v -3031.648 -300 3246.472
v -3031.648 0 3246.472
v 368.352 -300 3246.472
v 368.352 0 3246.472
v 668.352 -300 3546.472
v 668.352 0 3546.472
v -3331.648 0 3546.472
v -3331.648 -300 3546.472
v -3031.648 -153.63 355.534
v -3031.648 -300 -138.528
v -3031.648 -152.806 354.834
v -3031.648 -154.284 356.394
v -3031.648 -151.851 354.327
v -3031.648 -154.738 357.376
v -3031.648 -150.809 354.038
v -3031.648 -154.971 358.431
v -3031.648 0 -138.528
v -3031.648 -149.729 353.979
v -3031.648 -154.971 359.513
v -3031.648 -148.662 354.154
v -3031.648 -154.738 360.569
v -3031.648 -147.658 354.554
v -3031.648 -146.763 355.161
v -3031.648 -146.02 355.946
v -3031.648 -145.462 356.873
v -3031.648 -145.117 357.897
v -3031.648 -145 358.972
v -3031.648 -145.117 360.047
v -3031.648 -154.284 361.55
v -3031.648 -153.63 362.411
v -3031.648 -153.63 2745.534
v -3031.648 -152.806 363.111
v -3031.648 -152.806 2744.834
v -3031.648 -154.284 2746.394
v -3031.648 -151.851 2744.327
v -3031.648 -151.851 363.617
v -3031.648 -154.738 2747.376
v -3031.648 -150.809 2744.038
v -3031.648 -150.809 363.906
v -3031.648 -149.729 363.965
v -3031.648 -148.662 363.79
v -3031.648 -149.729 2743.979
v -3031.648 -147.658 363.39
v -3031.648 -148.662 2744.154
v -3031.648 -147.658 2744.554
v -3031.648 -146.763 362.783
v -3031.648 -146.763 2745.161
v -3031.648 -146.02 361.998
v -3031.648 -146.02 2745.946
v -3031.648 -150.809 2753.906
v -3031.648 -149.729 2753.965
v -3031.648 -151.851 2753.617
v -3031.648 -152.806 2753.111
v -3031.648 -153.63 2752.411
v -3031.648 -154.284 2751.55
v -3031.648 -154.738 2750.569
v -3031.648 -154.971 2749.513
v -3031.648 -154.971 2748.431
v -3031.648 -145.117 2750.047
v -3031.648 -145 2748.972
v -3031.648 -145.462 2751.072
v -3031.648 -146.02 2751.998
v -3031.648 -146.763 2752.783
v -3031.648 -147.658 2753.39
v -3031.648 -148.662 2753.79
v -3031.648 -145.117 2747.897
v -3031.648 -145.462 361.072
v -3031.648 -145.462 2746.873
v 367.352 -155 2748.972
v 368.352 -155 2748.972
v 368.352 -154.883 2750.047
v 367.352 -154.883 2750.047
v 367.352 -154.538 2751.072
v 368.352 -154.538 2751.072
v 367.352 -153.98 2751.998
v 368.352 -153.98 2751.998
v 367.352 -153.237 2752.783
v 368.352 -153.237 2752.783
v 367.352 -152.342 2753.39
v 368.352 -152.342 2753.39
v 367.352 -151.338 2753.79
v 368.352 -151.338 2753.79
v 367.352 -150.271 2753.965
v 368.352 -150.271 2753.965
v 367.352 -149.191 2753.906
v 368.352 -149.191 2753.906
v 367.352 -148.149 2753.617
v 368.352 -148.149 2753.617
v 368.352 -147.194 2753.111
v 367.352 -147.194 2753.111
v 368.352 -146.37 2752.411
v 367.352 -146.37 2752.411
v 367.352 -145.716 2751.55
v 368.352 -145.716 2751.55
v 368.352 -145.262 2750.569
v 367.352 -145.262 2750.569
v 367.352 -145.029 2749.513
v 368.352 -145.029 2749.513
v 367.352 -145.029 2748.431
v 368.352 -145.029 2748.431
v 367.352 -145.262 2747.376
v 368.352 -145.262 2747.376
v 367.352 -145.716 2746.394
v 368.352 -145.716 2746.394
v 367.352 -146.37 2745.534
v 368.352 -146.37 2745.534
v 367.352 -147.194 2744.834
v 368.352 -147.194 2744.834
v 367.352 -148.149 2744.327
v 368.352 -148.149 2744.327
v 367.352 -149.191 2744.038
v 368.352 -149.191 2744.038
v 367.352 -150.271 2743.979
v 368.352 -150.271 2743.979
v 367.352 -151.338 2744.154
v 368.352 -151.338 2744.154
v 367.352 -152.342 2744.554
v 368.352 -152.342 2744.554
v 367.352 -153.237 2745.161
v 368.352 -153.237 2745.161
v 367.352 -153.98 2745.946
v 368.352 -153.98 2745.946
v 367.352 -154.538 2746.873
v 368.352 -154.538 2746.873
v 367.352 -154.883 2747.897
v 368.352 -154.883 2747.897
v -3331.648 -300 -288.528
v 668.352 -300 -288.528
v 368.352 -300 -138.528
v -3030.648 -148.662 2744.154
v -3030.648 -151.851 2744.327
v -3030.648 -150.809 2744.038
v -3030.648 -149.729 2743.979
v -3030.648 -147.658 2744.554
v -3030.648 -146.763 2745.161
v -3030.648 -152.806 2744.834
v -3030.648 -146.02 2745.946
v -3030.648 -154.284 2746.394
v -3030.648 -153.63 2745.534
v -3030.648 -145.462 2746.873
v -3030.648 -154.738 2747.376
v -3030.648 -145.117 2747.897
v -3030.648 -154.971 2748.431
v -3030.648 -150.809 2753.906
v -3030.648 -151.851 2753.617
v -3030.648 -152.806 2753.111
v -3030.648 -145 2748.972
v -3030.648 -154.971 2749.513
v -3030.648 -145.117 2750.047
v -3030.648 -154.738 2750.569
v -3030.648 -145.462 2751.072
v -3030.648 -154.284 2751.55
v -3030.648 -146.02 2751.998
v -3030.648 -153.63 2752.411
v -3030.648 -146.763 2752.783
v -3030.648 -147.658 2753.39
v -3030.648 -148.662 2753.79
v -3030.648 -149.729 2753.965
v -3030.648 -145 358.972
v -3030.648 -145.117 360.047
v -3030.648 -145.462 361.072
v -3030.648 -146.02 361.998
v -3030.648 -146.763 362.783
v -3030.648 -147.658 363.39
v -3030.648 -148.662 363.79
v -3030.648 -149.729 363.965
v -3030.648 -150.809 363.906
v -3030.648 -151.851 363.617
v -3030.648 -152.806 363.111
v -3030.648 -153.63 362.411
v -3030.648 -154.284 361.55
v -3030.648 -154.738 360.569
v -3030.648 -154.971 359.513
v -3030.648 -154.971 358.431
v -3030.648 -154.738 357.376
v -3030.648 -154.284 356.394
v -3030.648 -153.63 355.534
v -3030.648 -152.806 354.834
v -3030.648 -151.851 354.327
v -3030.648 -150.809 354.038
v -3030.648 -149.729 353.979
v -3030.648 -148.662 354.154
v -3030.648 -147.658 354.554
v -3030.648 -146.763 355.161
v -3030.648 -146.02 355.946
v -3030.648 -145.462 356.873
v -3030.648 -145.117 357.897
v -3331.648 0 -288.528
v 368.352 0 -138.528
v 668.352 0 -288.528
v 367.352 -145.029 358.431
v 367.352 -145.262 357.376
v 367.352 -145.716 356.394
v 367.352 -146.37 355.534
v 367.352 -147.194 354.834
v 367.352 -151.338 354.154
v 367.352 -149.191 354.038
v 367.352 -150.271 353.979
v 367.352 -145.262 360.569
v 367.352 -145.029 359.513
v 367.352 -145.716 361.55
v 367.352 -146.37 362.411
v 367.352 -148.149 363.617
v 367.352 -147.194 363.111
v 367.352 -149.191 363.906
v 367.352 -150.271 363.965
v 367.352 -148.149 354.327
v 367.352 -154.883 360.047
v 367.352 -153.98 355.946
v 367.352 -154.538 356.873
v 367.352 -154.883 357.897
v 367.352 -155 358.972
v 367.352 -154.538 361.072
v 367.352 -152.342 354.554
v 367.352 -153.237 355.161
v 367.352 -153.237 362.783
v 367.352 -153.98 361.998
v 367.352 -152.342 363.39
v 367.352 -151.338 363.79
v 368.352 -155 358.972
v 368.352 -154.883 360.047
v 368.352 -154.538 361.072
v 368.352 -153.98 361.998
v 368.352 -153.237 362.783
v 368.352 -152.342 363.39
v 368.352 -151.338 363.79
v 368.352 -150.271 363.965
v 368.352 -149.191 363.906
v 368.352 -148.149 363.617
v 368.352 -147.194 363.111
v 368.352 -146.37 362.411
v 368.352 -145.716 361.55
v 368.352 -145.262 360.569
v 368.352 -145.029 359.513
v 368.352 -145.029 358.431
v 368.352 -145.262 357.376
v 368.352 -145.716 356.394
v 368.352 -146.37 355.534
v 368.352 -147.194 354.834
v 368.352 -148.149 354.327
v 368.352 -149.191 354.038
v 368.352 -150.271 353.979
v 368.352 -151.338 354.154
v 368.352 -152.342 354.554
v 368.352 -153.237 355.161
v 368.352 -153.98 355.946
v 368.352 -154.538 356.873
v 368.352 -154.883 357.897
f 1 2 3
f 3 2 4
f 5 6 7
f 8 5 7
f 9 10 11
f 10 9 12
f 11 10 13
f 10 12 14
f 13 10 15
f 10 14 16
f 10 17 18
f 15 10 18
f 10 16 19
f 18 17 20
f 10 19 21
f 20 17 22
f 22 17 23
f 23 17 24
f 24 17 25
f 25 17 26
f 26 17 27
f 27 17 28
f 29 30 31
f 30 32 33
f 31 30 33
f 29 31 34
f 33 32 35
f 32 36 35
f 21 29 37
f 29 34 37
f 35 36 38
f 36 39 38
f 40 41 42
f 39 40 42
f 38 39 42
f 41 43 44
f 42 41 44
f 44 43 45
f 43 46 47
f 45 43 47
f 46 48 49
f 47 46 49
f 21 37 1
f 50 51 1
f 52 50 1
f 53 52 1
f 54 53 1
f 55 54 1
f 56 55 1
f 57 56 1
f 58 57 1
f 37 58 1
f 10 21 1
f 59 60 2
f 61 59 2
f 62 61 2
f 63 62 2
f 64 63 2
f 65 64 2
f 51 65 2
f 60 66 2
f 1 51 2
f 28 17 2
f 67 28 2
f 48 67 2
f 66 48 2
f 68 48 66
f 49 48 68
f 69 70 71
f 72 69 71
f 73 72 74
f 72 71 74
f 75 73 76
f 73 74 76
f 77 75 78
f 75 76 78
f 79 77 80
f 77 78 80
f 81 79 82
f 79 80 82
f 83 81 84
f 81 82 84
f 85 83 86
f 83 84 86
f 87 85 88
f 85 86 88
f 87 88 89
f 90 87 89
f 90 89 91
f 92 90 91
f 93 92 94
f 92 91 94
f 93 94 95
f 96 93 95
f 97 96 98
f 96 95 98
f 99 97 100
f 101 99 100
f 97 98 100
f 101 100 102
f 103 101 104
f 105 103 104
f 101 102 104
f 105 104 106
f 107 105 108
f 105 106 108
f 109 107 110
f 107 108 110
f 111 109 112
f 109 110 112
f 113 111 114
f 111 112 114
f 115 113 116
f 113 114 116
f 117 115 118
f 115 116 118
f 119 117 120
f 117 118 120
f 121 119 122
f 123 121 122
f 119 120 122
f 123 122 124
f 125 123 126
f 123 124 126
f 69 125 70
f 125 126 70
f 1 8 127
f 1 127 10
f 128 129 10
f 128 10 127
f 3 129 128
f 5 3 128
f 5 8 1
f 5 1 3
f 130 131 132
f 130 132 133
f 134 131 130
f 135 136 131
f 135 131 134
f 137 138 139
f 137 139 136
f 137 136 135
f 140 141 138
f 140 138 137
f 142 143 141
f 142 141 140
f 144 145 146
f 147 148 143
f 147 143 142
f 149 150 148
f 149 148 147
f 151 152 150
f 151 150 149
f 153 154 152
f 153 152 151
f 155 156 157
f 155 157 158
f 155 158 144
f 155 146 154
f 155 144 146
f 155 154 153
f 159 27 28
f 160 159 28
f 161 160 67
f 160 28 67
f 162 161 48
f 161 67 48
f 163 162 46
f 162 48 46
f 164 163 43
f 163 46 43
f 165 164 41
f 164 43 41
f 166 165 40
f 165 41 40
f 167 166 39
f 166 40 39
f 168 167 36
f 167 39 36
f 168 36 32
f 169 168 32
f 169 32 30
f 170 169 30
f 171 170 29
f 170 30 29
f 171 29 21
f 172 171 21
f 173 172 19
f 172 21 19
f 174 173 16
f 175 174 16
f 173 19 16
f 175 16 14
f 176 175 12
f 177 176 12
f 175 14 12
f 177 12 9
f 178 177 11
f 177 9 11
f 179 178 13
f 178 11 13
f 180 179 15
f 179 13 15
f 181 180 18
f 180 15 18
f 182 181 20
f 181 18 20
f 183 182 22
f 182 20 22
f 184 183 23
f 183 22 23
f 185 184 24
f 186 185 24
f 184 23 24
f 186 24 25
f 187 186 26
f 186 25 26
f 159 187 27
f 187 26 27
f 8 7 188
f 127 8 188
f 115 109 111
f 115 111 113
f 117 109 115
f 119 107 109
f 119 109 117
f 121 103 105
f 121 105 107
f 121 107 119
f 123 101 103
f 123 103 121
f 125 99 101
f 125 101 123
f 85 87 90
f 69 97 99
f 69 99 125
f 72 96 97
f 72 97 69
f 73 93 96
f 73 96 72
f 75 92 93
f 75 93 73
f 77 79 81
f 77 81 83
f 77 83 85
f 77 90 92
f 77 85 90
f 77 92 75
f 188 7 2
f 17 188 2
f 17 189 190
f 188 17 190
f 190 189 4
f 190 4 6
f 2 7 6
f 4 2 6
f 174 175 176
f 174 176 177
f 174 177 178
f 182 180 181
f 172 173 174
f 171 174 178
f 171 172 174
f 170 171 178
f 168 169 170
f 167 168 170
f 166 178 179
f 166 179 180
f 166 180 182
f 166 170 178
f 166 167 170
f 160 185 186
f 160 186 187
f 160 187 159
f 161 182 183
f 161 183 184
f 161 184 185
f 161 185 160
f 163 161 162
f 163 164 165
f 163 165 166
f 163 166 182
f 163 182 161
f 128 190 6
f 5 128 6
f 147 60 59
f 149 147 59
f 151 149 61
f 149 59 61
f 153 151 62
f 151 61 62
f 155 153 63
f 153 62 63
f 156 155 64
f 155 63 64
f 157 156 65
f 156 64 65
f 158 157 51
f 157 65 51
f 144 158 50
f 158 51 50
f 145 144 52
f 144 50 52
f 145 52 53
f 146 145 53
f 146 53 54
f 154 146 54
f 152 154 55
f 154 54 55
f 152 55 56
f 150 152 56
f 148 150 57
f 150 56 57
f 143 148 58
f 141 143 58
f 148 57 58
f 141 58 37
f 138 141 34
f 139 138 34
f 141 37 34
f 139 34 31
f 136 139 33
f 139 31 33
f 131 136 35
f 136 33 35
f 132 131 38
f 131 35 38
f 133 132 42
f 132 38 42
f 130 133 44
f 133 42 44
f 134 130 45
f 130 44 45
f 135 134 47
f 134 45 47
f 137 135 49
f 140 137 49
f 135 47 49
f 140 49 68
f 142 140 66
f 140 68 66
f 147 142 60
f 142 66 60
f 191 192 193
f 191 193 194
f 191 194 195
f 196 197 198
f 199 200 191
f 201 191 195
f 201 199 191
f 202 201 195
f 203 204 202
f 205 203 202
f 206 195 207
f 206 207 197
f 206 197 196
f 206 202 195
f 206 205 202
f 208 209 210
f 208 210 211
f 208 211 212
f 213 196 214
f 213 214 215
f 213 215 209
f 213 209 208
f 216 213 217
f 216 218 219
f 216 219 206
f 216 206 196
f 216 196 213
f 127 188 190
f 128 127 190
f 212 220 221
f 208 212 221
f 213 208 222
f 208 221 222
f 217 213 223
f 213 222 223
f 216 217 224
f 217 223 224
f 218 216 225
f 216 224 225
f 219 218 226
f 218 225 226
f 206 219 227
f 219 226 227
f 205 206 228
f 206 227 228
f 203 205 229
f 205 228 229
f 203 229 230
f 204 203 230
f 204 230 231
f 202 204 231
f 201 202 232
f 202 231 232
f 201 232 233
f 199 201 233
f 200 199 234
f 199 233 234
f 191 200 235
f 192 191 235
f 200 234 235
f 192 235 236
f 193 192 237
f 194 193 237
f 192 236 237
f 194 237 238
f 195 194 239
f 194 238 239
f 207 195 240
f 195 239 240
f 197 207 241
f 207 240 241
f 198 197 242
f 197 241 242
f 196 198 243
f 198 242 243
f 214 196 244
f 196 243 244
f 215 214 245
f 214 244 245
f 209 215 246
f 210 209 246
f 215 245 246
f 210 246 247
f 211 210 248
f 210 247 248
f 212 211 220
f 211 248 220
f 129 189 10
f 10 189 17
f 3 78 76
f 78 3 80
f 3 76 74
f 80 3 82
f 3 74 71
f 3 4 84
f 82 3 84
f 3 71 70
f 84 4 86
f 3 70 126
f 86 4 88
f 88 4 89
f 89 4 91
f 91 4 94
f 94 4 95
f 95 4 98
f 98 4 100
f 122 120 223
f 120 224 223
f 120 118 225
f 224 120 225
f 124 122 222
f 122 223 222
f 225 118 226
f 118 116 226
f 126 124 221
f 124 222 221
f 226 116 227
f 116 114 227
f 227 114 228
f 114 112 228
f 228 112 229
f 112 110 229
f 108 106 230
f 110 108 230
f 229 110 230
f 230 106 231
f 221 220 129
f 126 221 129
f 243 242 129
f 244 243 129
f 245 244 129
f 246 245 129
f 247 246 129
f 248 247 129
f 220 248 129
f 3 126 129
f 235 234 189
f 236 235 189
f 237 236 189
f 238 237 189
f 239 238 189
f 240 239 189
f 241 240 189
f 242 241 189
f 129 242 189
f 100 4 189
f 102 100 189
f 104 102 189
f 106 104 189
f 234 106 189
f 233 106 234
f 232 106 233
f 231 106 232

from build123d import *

# Parameters (mm, degrees)
F1_DEPTH = 300
F2_R     = 5
F3_DEPTH = 1
F4_R     = 5
F5_DEPTH = 1


with BuildPart() as f1:
    # F0 (on Front) → F1 (new body)
    with BuildSketch(Plane.XZ):
        Polygon((-3031.6483664513, -138.527944684), (-3031.6483664513, 3246.472055316), (368.3516335487, 3246.472055316), (368.3516335487, -138.527944684), (668.3516335487, -138.527944684), (668.3516335487, 3546.472055316), (-3331.6483664513, 3546.472055316), (-3331.6483664513, -138.527944684), align=None)
        Polygon((368.3516335487, -138.527944684), (-3031.6483664513, -138.527944684), (-3331.6483664513, -138.527944684), (-3331.6483664513, -288.527944684), (668.3516335487, -288.527944684), (668.3516335487, -138.527944684), align=None)
    extrude(amount=F1_DEPTH)

    # F2 (on face) → F3 (join)
    with BuildSketch(Plane.YZ.offset(-3031.6483664513)):
        with Locations((-150, 2748.972055316)):
            Circle(F2_R)
        with Locations((-150, 358.972055316)):
            Circle(F2_R)
    extrude(amount=F3_DEPTH)

    # F4 (on face) → F5 (join)
    with BuildSketch(Plane(origin=(368.3516335487, 0, 0), x_dir=(0, -1, 0), z_dir=(-1, 0, 0))):
        with Locations((150, 2748.972055316)):
            Circle(F4_R)
        with Locations((150, 358.972055316)):
            Circle(F4_R)
    extrude(amount=F5_DEPTH)


solid = f1.part
